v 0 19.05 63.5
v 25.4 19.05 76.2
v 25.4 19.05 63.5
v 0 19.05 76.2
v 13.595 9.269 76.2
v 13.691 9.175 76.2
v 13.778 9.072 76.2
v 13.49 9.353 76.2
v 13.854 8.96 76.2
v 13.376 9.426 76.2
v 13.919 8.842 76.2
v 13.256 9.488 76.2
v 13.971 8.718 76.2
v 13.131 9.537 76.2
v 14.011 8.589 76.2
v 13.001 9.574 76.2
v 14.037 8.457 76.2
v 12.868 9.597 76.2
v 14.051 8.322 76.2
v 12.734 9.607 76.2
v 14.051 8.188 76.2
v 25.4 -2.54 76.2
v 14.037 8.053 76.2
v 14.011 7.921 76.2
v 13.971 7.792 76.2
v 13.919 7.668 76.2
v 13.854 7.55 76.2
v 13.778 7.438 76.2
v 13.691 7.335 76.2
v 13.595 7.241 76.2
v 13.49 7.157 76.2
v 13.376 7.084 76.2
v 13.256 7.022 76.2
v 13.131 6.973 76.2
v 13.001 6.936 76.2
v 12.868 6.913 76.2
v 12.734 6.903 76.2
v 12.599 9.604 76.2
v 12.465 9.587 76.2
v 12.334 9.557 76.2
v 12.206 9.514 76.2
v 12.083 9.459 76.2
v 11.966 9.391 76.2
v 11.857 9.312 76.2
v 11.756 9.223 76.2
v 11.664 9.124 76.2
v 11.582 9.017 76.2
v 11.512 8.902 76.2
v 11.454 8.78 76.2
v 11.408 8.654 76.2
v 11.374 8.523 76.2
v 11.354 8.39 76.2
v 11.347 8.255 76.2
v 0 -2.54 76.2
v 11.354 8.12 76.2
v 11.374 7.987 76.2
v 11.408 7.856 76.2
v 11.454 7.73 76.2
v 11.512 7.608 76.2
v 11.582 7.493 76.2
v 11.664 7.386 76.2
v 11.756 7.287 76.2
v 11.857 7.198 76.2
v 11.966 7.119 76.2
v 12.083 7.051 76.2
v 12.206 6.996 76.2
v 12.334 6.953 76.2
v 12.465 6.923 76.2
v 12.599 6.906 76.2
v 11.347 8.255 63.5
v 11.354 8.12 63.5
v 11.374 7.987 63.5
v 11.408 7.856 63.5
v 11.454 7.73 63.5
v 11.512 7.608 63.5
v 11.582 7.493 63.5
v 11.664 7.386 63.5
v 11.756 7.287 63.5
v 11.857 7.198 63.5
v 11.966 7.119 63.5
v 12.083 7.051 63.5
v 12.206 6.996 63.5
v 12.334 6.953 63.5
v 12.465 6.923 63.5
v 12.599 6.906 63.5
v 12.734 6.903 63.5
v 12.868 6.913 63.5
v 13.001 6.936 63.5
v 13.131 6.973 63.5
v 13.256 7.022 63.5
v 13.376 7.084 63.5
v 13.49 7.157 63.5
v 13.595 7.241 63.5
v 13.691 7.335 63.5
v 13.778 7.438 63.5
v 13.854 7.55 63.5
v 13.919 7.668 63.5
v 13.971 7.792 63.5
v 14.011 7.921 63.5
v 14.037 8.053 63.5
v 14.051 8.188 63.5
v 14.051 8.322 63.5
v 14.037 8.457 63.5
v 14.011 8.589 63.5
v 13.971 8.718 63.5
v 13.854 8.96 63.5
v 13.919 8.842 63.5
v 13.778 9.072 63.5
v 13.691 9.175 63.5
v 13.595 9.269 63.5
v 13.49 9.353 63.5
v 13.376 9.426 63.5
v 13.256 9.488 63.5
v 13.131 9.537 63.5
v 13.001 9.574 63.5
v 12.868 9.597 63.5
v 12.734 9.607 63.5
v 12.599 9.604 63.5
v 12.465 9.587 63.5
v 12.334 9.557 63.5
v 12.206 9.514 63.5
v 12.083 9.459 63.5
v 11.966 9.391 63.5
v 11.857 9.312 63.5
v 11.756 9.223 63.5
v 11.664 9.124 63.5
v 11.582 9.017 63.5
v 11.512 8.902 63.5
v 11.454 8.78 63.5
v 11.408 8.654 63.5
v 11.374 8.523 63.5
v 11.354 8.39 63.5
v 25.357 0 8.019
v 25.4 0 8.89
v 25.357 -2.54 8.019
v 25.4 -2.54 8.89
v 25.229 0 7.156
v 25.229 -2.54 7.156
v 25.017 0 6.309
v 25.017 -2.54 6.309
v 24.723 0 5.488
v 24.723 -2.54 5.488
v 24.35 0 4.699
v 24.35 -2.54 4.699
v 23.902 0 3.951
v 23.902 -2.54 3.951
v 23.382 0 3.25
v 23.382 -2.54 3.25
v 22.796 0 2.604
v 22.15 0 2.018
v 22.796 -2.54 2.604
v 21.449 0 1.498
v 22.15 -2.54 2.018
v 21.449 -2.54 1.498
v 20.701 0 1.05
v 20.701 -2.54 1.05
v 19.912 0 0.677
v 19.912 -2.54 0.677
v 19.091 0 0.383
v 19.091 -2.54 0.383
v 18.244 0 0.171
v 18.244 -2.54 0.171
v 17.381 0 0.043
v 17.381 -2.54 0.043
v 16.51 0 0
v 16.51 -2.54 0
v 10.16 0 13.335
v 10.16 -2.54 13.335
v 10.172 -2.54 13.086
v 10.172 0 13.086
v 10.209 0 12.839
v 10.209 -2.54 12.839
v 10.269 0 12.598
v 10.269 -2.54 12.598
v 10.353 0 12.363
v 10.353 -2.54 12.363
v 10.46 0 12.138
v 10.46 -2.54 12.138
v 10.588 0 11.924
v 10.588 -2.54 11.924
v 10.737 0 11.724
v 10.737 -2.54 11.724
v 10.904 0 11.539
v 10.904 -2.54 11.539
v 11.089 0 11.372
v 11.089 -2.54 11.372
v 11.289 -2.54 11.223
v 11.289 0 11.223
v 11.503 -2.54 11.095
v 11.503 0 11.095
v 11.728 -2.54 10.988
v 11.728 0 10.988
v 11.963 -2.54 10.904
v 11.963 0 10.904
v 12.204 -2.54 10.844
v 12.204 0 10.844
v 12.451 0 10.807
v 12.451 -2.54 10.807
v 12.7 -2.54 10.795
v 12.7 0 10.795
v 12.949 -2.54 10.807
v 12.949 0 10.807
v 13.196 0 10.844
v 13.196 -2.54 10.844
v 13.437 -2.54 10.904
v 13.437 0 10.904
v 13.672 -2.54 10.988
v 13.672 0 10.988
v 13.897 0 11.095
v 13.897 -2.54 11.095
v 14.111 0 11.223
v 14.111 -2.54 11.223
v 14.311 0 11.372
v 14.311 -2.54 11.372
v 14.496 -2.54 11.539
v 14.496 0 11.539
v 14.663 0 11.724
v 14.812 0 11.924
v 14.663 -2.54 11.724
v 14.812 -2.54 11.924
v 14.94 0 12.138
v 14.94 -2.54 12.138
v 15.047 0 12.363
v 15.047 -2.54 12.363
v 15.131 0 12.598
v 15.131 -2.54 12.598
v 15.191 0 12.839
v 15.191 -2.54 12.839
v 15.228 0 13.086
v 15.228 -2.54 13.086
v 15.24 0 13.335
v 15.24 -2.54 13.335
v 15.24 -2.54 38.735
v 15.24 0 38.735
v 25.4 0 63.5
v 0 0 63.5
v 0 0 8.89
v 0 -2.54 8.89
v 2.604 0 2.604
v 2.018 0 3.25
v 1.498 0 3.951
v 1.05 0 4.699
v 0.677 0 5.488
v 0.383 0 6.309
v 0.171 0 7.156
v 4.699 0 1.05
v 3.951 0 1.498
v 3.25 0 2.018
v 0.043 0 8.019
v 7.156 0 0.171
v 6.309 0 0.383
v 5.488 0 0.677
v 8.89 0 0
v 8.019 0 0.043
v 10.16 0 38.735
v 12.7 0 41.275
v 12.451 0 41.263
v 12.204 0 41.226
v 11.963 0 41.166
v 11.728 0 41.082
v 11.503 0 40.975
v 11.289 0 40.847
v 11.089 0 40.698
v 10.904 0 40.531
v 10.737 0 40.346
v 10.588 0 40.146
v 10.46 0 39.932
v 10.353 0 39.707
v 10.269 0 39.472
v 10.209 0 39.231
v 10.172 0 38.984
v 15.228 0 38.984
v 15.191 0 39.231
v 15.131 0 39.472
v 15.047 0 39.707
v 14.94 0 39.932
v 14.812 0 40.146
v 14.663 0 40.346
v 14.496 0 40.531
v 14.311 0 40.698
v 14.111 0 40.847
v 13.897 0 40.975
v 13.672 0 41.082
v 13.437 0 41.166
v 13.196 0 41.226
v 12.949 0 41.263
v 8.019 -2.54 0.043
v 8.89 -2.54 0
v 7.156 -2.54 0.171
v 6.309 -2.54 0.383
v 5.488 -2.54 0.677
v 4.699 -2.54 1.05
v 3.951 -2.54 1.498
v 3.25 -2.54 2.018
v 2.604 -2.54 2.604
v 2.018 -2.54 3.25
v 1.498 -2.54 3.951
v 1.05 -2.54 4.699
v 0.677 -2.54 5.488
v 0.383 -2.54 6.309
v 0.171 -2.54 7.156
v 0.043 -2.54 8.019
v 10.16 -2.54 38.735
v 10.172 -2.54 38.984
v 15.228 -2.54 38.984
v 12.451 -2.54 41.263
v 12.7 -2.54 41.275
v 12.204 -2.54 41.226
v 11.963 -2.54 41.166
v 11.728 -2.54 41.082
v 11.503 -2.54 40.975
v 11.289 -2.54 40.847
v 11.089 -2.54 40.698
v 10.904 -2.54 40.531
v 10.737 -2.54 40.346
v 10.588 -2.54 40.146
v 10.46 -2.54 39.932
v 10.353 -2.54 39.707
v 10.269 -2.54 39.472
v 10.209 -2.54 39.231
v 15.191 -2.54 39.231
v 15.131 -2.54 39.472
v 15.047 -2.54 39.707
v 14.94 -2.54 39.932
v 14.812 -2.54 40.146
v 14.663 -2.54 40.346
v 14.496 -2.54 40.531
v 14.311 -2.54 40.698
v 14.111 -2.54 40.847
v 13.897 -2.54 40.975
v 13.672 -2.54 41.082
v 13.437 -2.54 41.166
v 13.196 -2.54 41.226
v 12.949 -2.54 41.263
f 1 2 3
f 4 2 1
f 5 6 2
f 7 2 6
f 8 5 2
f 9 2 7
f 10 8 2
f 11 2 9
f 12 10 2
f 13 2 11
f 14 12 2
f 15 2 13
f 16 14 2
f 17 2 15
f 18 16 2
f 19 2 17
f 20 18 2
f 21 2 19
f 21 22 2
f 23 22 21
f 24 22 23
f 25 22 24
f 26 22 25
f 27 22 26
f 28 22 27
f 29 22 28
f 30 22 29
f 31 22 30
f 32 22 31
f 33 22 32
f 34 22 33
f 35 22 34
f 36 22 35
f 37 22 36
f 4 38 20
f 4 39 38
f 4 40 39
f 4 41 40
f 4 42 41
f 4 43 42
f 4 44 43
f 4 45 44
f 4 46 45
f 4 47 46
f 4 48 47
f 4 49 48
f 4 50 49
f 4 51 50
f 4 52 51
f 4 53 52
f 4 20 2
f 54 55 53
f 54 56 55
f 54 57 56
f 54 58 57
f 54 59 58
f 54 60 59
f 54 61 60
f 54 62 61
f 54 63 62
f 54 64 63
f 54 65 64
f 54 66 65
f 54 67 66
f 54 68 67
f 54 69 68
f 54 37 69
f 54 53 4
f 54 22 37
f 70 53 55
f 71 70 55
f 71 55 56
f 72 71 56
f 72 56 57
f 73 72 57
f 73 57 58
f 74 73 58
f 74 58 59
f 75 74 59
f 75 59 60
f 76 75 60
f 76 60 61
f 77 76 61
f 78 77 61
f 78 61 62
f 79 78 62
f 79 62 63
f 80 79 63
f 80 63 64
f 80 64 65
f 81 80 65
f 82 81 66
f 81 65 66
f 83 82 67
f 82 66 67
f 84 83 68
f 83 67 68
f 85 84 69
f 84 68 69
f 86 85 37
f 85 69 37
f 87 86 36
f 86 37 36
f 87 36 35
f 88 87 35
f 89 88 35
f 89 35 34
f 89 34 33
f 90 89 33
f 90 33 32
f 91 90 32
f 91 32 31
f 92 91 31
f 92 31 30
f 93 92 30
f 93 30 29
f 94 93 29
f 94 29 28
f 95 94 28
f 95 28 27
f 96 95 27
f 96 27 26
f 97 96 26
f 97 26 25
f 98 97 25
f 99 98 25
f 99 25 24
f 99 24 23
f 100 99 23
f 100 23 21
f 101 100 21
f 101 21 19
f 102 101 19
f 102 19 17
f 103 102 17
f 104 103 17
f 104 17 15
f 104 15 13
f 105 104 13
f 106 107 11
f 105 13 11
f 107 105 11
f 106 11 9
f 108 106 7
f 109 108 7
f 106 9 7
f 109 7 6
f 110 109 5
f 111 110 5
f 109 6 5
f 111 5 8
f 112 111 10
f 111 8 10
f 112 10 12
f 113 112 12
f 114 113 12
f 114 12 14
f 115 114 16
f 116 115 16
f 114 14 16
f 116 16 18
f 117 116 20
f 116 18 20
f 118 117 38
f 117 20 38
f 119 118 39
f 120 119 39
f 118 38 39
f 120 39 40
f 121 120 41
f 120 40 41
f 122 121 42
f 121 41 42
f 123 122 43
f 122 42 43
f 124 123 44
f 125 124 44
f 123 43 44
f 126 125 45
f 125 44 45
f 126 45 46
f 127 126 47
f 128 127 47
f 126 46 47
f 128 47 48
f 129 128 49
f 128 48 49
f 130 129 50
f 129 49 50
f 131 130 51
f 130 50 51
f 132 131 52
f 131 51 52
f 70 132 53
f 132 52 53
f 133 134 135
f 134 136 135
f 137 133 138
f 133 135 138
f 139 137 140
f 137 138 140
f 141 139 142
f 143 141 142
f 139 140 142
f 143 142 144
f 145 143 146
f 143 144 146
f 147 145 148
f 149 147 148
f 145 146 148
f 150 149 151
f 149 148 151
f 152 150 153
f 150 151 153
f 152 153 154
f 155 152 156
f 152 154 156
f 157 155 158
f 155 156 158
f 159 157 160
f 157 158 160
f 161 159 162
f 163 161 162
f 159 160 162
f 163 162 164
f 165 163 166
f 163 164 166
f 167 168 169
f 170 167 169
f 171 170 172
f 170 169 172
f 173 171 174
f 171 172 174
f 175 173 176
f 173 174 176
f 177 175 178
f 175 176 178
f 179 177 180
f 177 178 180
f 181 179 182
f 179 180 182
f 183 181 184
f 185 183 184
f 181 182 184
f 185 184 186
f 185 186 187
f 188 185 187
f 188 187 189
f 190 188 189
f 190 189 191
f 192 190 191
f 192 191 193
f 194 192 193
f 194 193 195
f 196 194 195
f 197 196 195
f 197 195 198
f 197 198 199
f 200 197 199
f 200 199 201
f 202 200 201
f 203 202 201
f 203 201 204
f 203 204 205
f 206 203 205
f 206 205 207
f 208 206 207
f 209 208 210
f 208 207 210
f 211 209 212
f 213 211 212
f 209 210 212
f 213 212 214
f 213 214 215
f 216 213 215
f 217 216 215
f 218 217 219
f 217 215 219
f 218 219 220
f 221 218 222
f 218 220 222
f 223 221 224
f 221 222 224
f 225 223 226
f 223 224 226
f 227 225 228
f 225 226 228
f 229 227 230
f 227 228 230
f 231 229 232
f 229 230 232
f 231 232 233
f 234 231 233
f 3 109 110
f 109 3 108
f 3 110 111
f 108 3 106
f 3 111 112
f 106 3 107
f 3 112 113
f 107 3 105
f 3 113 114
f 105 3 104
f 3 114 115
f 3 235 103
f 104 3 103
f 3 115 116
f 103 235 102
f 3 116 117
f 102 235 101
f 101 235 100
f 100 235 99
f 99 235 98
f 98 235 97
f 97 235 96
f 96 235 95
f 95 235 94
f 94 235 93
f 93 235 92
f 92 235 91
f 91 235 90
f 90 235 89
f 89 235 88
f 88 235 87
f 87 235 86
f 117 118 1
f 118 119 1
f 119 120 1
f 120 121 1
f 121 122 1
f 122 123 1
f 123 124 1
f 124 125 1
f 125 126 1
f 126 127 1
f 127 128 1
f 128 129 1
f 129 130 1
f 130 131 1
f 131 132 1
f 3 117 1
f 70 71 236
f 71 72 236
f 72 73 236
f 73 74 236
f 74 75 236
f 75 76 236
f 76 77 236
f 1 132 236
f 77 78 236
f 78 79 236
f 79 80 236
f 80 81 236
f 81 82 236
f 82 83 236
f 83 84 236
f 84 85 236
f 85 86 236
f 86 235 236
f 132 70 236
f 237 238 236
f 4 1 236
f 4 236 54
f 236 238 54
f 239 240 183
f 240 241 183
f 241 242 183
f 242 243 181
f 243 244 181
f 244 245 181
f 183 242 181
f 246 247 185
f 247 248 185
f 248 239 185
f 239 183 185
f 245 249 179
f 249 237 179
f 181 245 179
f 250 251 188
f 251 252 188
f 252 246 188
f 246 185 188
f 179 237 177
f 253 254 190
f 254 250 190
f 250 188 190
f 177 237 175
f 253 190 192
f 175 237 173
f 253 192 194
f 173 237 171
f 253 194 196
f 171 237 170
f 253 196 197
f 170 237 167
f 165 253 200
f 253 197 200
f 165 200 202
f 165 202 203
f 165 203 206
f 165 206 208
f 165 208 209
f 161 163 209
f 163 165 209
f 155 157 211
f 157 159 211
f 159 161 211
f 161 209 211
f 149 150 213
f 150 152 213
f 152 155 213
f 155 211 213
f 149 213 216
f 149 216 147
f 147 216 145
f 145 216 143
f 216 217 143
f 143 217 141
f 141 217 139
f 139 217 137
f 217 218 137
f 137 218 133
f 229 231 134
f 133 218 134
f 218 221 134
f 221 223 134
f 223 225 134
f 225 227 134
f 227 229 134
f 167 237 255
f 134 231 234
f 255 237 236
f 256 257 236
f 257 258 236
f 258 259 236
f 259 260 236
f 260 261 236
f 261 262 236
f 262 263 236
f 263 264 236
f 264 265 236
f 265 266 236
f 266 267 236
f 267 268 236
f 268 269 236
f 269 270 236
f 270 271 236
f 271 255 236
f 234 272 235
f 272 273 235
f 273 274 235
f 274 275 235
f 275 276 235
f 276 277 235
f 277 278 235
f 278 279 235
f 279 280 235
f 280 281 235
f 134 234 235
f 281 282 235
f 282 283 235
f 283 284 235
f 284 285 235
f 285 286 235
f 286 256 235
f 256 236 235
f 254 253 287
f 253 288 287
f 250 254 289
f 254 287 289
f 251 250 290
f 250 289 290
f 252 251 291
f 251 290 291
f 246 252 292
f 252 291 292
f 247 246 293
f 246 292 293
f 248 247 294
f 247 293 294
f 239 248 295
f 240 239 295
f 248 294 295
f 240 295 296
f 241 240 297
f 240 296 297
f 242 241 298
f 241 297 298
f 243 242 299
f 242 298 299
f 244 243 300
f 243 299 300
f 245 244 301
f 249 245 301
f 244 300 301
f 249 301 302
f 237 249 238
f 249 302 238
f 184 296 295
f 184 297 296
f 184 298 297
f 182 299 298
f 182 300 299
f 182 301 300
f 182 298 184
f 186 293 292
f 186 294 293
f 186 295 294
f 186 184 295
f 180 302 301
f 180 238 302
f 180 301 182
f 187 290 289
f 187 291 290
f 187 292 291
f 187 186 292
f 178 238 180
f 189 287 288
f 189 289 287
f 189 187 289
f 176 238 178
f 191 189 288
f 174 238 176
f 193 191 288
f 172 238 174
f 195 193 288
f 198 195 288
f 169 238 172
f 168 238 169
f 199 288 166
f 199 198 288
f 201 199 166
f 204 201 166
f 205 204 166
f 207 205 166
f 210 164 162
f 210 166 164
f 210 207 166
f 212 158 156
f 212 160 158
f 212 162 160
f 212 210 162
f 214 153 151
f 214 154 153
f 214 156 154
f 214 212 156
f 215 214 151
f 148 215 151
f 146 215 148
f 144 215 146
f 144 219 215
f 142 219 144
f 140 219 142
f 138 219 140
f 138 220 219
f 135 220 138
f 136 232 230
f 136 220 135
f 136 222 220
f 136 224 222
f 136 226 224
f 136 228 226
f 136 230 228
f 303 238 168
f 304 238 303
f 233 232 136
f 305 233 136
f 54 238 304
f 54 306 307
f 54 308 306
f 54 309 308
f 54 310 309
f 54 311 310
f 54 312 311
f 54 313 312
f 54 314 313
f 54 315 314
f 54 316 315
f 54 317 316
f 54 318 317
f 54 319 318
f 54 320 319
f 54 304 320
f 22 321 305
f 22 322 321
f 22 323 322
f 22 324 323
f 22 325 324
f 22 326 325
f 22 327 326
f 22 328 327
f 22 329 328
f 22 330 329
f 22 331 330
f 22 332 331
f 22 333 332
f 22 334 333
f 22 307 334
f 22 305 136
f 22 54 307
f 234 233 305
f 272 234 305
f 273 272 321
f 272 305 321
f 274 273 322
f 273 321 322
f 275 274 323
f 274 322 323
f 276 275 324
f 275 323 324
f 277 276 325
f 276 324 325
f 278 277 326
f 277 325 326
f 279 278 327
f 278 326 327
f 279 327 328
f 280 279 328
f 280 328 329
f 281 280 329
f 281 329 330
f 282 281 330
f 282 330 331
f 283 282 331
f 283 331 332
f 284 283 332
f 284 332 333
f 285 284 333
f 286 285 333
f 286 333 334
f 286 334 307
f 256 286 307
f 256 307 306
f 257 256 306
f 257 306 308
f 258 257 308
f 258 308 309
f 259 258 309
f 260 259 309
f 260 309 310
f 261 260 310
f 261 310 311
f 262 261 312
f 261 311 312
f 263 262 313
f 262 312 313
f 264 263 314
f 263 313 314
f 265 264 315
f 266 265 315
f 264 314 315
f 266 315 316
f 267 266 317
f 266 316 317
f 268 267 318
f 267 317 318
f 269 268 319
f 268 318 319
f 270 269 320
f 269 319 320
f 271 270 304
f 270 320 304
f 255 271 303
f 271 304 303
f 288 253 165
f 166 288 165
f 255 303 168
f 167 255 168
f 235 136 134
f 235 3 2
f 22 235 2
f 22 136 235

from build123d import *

# Parameters (mm, degrees)
F0_W     = 25.4
F0_H     = 76.2
F1_DEPTH = 2.54
F2_W     = 25.4
F2_H     = 12.7
F3_DEPTH = 19.05
F5_D     = 2.7051
F7_DEPTH = 21.591
F8_R     = 8.89


with BuildPart() as f1:
    # F0 (on Front) → F1 (new body)
    with BuildSketch(Plane.XZ):
        with Locations((12.7, 38.1)):
            Rectangle(F0_W, F0_H)
    extrude(amount=F1_DEPTH)

    # F2 (on face) → F3 (join)
    with BuildSketch(Plane(origin=(0, 0, 0), x_dir=(-1, 0, 0), z_dir=(0, 1, 0))):
        with Locations((-12.7, 69.85)):
            Rectangle(F2_W, F2_H)
    extrude(amount=F3_DEPTH)

    # F5 (through all)
    with Locations(Plane(origin=(0, 0, 63.5), x_dir=(1, 0, 0), z_dir=(0, 0, -1))):
        with Locations((12.7, -8.255)):
            Hole(F5_D / 2)

    # F6 (on face) → F7 (cut, through all)
    with BuildSketch(Plane.XZ.offset(2.54)):
        with BuildLine():
            ThreePointArc((15.24, 38.735), (12.7, 41.275), (10.16, 38.735))
            Line((10.16, 38.735), (10.16, 13.335))
            ThreePointArc((10.16, 13.335), (12.7, 10.795), (15.24, 13.335))
            Line((15.24, 13.335), (15.24, 38.735))
        make_face()
    extrude(amount=-F7_DEPTH, mode=Mode.SUBTRACT)

    # F8
    f8_edges = [f1.edges().sort_by_distance(p)[0] for p in [
        (0, -1.27, 0),
        (25.4, -1.27, 0),
    ]]
    fillet(f8_edges, radius=F8_R)


solid = f1.part
